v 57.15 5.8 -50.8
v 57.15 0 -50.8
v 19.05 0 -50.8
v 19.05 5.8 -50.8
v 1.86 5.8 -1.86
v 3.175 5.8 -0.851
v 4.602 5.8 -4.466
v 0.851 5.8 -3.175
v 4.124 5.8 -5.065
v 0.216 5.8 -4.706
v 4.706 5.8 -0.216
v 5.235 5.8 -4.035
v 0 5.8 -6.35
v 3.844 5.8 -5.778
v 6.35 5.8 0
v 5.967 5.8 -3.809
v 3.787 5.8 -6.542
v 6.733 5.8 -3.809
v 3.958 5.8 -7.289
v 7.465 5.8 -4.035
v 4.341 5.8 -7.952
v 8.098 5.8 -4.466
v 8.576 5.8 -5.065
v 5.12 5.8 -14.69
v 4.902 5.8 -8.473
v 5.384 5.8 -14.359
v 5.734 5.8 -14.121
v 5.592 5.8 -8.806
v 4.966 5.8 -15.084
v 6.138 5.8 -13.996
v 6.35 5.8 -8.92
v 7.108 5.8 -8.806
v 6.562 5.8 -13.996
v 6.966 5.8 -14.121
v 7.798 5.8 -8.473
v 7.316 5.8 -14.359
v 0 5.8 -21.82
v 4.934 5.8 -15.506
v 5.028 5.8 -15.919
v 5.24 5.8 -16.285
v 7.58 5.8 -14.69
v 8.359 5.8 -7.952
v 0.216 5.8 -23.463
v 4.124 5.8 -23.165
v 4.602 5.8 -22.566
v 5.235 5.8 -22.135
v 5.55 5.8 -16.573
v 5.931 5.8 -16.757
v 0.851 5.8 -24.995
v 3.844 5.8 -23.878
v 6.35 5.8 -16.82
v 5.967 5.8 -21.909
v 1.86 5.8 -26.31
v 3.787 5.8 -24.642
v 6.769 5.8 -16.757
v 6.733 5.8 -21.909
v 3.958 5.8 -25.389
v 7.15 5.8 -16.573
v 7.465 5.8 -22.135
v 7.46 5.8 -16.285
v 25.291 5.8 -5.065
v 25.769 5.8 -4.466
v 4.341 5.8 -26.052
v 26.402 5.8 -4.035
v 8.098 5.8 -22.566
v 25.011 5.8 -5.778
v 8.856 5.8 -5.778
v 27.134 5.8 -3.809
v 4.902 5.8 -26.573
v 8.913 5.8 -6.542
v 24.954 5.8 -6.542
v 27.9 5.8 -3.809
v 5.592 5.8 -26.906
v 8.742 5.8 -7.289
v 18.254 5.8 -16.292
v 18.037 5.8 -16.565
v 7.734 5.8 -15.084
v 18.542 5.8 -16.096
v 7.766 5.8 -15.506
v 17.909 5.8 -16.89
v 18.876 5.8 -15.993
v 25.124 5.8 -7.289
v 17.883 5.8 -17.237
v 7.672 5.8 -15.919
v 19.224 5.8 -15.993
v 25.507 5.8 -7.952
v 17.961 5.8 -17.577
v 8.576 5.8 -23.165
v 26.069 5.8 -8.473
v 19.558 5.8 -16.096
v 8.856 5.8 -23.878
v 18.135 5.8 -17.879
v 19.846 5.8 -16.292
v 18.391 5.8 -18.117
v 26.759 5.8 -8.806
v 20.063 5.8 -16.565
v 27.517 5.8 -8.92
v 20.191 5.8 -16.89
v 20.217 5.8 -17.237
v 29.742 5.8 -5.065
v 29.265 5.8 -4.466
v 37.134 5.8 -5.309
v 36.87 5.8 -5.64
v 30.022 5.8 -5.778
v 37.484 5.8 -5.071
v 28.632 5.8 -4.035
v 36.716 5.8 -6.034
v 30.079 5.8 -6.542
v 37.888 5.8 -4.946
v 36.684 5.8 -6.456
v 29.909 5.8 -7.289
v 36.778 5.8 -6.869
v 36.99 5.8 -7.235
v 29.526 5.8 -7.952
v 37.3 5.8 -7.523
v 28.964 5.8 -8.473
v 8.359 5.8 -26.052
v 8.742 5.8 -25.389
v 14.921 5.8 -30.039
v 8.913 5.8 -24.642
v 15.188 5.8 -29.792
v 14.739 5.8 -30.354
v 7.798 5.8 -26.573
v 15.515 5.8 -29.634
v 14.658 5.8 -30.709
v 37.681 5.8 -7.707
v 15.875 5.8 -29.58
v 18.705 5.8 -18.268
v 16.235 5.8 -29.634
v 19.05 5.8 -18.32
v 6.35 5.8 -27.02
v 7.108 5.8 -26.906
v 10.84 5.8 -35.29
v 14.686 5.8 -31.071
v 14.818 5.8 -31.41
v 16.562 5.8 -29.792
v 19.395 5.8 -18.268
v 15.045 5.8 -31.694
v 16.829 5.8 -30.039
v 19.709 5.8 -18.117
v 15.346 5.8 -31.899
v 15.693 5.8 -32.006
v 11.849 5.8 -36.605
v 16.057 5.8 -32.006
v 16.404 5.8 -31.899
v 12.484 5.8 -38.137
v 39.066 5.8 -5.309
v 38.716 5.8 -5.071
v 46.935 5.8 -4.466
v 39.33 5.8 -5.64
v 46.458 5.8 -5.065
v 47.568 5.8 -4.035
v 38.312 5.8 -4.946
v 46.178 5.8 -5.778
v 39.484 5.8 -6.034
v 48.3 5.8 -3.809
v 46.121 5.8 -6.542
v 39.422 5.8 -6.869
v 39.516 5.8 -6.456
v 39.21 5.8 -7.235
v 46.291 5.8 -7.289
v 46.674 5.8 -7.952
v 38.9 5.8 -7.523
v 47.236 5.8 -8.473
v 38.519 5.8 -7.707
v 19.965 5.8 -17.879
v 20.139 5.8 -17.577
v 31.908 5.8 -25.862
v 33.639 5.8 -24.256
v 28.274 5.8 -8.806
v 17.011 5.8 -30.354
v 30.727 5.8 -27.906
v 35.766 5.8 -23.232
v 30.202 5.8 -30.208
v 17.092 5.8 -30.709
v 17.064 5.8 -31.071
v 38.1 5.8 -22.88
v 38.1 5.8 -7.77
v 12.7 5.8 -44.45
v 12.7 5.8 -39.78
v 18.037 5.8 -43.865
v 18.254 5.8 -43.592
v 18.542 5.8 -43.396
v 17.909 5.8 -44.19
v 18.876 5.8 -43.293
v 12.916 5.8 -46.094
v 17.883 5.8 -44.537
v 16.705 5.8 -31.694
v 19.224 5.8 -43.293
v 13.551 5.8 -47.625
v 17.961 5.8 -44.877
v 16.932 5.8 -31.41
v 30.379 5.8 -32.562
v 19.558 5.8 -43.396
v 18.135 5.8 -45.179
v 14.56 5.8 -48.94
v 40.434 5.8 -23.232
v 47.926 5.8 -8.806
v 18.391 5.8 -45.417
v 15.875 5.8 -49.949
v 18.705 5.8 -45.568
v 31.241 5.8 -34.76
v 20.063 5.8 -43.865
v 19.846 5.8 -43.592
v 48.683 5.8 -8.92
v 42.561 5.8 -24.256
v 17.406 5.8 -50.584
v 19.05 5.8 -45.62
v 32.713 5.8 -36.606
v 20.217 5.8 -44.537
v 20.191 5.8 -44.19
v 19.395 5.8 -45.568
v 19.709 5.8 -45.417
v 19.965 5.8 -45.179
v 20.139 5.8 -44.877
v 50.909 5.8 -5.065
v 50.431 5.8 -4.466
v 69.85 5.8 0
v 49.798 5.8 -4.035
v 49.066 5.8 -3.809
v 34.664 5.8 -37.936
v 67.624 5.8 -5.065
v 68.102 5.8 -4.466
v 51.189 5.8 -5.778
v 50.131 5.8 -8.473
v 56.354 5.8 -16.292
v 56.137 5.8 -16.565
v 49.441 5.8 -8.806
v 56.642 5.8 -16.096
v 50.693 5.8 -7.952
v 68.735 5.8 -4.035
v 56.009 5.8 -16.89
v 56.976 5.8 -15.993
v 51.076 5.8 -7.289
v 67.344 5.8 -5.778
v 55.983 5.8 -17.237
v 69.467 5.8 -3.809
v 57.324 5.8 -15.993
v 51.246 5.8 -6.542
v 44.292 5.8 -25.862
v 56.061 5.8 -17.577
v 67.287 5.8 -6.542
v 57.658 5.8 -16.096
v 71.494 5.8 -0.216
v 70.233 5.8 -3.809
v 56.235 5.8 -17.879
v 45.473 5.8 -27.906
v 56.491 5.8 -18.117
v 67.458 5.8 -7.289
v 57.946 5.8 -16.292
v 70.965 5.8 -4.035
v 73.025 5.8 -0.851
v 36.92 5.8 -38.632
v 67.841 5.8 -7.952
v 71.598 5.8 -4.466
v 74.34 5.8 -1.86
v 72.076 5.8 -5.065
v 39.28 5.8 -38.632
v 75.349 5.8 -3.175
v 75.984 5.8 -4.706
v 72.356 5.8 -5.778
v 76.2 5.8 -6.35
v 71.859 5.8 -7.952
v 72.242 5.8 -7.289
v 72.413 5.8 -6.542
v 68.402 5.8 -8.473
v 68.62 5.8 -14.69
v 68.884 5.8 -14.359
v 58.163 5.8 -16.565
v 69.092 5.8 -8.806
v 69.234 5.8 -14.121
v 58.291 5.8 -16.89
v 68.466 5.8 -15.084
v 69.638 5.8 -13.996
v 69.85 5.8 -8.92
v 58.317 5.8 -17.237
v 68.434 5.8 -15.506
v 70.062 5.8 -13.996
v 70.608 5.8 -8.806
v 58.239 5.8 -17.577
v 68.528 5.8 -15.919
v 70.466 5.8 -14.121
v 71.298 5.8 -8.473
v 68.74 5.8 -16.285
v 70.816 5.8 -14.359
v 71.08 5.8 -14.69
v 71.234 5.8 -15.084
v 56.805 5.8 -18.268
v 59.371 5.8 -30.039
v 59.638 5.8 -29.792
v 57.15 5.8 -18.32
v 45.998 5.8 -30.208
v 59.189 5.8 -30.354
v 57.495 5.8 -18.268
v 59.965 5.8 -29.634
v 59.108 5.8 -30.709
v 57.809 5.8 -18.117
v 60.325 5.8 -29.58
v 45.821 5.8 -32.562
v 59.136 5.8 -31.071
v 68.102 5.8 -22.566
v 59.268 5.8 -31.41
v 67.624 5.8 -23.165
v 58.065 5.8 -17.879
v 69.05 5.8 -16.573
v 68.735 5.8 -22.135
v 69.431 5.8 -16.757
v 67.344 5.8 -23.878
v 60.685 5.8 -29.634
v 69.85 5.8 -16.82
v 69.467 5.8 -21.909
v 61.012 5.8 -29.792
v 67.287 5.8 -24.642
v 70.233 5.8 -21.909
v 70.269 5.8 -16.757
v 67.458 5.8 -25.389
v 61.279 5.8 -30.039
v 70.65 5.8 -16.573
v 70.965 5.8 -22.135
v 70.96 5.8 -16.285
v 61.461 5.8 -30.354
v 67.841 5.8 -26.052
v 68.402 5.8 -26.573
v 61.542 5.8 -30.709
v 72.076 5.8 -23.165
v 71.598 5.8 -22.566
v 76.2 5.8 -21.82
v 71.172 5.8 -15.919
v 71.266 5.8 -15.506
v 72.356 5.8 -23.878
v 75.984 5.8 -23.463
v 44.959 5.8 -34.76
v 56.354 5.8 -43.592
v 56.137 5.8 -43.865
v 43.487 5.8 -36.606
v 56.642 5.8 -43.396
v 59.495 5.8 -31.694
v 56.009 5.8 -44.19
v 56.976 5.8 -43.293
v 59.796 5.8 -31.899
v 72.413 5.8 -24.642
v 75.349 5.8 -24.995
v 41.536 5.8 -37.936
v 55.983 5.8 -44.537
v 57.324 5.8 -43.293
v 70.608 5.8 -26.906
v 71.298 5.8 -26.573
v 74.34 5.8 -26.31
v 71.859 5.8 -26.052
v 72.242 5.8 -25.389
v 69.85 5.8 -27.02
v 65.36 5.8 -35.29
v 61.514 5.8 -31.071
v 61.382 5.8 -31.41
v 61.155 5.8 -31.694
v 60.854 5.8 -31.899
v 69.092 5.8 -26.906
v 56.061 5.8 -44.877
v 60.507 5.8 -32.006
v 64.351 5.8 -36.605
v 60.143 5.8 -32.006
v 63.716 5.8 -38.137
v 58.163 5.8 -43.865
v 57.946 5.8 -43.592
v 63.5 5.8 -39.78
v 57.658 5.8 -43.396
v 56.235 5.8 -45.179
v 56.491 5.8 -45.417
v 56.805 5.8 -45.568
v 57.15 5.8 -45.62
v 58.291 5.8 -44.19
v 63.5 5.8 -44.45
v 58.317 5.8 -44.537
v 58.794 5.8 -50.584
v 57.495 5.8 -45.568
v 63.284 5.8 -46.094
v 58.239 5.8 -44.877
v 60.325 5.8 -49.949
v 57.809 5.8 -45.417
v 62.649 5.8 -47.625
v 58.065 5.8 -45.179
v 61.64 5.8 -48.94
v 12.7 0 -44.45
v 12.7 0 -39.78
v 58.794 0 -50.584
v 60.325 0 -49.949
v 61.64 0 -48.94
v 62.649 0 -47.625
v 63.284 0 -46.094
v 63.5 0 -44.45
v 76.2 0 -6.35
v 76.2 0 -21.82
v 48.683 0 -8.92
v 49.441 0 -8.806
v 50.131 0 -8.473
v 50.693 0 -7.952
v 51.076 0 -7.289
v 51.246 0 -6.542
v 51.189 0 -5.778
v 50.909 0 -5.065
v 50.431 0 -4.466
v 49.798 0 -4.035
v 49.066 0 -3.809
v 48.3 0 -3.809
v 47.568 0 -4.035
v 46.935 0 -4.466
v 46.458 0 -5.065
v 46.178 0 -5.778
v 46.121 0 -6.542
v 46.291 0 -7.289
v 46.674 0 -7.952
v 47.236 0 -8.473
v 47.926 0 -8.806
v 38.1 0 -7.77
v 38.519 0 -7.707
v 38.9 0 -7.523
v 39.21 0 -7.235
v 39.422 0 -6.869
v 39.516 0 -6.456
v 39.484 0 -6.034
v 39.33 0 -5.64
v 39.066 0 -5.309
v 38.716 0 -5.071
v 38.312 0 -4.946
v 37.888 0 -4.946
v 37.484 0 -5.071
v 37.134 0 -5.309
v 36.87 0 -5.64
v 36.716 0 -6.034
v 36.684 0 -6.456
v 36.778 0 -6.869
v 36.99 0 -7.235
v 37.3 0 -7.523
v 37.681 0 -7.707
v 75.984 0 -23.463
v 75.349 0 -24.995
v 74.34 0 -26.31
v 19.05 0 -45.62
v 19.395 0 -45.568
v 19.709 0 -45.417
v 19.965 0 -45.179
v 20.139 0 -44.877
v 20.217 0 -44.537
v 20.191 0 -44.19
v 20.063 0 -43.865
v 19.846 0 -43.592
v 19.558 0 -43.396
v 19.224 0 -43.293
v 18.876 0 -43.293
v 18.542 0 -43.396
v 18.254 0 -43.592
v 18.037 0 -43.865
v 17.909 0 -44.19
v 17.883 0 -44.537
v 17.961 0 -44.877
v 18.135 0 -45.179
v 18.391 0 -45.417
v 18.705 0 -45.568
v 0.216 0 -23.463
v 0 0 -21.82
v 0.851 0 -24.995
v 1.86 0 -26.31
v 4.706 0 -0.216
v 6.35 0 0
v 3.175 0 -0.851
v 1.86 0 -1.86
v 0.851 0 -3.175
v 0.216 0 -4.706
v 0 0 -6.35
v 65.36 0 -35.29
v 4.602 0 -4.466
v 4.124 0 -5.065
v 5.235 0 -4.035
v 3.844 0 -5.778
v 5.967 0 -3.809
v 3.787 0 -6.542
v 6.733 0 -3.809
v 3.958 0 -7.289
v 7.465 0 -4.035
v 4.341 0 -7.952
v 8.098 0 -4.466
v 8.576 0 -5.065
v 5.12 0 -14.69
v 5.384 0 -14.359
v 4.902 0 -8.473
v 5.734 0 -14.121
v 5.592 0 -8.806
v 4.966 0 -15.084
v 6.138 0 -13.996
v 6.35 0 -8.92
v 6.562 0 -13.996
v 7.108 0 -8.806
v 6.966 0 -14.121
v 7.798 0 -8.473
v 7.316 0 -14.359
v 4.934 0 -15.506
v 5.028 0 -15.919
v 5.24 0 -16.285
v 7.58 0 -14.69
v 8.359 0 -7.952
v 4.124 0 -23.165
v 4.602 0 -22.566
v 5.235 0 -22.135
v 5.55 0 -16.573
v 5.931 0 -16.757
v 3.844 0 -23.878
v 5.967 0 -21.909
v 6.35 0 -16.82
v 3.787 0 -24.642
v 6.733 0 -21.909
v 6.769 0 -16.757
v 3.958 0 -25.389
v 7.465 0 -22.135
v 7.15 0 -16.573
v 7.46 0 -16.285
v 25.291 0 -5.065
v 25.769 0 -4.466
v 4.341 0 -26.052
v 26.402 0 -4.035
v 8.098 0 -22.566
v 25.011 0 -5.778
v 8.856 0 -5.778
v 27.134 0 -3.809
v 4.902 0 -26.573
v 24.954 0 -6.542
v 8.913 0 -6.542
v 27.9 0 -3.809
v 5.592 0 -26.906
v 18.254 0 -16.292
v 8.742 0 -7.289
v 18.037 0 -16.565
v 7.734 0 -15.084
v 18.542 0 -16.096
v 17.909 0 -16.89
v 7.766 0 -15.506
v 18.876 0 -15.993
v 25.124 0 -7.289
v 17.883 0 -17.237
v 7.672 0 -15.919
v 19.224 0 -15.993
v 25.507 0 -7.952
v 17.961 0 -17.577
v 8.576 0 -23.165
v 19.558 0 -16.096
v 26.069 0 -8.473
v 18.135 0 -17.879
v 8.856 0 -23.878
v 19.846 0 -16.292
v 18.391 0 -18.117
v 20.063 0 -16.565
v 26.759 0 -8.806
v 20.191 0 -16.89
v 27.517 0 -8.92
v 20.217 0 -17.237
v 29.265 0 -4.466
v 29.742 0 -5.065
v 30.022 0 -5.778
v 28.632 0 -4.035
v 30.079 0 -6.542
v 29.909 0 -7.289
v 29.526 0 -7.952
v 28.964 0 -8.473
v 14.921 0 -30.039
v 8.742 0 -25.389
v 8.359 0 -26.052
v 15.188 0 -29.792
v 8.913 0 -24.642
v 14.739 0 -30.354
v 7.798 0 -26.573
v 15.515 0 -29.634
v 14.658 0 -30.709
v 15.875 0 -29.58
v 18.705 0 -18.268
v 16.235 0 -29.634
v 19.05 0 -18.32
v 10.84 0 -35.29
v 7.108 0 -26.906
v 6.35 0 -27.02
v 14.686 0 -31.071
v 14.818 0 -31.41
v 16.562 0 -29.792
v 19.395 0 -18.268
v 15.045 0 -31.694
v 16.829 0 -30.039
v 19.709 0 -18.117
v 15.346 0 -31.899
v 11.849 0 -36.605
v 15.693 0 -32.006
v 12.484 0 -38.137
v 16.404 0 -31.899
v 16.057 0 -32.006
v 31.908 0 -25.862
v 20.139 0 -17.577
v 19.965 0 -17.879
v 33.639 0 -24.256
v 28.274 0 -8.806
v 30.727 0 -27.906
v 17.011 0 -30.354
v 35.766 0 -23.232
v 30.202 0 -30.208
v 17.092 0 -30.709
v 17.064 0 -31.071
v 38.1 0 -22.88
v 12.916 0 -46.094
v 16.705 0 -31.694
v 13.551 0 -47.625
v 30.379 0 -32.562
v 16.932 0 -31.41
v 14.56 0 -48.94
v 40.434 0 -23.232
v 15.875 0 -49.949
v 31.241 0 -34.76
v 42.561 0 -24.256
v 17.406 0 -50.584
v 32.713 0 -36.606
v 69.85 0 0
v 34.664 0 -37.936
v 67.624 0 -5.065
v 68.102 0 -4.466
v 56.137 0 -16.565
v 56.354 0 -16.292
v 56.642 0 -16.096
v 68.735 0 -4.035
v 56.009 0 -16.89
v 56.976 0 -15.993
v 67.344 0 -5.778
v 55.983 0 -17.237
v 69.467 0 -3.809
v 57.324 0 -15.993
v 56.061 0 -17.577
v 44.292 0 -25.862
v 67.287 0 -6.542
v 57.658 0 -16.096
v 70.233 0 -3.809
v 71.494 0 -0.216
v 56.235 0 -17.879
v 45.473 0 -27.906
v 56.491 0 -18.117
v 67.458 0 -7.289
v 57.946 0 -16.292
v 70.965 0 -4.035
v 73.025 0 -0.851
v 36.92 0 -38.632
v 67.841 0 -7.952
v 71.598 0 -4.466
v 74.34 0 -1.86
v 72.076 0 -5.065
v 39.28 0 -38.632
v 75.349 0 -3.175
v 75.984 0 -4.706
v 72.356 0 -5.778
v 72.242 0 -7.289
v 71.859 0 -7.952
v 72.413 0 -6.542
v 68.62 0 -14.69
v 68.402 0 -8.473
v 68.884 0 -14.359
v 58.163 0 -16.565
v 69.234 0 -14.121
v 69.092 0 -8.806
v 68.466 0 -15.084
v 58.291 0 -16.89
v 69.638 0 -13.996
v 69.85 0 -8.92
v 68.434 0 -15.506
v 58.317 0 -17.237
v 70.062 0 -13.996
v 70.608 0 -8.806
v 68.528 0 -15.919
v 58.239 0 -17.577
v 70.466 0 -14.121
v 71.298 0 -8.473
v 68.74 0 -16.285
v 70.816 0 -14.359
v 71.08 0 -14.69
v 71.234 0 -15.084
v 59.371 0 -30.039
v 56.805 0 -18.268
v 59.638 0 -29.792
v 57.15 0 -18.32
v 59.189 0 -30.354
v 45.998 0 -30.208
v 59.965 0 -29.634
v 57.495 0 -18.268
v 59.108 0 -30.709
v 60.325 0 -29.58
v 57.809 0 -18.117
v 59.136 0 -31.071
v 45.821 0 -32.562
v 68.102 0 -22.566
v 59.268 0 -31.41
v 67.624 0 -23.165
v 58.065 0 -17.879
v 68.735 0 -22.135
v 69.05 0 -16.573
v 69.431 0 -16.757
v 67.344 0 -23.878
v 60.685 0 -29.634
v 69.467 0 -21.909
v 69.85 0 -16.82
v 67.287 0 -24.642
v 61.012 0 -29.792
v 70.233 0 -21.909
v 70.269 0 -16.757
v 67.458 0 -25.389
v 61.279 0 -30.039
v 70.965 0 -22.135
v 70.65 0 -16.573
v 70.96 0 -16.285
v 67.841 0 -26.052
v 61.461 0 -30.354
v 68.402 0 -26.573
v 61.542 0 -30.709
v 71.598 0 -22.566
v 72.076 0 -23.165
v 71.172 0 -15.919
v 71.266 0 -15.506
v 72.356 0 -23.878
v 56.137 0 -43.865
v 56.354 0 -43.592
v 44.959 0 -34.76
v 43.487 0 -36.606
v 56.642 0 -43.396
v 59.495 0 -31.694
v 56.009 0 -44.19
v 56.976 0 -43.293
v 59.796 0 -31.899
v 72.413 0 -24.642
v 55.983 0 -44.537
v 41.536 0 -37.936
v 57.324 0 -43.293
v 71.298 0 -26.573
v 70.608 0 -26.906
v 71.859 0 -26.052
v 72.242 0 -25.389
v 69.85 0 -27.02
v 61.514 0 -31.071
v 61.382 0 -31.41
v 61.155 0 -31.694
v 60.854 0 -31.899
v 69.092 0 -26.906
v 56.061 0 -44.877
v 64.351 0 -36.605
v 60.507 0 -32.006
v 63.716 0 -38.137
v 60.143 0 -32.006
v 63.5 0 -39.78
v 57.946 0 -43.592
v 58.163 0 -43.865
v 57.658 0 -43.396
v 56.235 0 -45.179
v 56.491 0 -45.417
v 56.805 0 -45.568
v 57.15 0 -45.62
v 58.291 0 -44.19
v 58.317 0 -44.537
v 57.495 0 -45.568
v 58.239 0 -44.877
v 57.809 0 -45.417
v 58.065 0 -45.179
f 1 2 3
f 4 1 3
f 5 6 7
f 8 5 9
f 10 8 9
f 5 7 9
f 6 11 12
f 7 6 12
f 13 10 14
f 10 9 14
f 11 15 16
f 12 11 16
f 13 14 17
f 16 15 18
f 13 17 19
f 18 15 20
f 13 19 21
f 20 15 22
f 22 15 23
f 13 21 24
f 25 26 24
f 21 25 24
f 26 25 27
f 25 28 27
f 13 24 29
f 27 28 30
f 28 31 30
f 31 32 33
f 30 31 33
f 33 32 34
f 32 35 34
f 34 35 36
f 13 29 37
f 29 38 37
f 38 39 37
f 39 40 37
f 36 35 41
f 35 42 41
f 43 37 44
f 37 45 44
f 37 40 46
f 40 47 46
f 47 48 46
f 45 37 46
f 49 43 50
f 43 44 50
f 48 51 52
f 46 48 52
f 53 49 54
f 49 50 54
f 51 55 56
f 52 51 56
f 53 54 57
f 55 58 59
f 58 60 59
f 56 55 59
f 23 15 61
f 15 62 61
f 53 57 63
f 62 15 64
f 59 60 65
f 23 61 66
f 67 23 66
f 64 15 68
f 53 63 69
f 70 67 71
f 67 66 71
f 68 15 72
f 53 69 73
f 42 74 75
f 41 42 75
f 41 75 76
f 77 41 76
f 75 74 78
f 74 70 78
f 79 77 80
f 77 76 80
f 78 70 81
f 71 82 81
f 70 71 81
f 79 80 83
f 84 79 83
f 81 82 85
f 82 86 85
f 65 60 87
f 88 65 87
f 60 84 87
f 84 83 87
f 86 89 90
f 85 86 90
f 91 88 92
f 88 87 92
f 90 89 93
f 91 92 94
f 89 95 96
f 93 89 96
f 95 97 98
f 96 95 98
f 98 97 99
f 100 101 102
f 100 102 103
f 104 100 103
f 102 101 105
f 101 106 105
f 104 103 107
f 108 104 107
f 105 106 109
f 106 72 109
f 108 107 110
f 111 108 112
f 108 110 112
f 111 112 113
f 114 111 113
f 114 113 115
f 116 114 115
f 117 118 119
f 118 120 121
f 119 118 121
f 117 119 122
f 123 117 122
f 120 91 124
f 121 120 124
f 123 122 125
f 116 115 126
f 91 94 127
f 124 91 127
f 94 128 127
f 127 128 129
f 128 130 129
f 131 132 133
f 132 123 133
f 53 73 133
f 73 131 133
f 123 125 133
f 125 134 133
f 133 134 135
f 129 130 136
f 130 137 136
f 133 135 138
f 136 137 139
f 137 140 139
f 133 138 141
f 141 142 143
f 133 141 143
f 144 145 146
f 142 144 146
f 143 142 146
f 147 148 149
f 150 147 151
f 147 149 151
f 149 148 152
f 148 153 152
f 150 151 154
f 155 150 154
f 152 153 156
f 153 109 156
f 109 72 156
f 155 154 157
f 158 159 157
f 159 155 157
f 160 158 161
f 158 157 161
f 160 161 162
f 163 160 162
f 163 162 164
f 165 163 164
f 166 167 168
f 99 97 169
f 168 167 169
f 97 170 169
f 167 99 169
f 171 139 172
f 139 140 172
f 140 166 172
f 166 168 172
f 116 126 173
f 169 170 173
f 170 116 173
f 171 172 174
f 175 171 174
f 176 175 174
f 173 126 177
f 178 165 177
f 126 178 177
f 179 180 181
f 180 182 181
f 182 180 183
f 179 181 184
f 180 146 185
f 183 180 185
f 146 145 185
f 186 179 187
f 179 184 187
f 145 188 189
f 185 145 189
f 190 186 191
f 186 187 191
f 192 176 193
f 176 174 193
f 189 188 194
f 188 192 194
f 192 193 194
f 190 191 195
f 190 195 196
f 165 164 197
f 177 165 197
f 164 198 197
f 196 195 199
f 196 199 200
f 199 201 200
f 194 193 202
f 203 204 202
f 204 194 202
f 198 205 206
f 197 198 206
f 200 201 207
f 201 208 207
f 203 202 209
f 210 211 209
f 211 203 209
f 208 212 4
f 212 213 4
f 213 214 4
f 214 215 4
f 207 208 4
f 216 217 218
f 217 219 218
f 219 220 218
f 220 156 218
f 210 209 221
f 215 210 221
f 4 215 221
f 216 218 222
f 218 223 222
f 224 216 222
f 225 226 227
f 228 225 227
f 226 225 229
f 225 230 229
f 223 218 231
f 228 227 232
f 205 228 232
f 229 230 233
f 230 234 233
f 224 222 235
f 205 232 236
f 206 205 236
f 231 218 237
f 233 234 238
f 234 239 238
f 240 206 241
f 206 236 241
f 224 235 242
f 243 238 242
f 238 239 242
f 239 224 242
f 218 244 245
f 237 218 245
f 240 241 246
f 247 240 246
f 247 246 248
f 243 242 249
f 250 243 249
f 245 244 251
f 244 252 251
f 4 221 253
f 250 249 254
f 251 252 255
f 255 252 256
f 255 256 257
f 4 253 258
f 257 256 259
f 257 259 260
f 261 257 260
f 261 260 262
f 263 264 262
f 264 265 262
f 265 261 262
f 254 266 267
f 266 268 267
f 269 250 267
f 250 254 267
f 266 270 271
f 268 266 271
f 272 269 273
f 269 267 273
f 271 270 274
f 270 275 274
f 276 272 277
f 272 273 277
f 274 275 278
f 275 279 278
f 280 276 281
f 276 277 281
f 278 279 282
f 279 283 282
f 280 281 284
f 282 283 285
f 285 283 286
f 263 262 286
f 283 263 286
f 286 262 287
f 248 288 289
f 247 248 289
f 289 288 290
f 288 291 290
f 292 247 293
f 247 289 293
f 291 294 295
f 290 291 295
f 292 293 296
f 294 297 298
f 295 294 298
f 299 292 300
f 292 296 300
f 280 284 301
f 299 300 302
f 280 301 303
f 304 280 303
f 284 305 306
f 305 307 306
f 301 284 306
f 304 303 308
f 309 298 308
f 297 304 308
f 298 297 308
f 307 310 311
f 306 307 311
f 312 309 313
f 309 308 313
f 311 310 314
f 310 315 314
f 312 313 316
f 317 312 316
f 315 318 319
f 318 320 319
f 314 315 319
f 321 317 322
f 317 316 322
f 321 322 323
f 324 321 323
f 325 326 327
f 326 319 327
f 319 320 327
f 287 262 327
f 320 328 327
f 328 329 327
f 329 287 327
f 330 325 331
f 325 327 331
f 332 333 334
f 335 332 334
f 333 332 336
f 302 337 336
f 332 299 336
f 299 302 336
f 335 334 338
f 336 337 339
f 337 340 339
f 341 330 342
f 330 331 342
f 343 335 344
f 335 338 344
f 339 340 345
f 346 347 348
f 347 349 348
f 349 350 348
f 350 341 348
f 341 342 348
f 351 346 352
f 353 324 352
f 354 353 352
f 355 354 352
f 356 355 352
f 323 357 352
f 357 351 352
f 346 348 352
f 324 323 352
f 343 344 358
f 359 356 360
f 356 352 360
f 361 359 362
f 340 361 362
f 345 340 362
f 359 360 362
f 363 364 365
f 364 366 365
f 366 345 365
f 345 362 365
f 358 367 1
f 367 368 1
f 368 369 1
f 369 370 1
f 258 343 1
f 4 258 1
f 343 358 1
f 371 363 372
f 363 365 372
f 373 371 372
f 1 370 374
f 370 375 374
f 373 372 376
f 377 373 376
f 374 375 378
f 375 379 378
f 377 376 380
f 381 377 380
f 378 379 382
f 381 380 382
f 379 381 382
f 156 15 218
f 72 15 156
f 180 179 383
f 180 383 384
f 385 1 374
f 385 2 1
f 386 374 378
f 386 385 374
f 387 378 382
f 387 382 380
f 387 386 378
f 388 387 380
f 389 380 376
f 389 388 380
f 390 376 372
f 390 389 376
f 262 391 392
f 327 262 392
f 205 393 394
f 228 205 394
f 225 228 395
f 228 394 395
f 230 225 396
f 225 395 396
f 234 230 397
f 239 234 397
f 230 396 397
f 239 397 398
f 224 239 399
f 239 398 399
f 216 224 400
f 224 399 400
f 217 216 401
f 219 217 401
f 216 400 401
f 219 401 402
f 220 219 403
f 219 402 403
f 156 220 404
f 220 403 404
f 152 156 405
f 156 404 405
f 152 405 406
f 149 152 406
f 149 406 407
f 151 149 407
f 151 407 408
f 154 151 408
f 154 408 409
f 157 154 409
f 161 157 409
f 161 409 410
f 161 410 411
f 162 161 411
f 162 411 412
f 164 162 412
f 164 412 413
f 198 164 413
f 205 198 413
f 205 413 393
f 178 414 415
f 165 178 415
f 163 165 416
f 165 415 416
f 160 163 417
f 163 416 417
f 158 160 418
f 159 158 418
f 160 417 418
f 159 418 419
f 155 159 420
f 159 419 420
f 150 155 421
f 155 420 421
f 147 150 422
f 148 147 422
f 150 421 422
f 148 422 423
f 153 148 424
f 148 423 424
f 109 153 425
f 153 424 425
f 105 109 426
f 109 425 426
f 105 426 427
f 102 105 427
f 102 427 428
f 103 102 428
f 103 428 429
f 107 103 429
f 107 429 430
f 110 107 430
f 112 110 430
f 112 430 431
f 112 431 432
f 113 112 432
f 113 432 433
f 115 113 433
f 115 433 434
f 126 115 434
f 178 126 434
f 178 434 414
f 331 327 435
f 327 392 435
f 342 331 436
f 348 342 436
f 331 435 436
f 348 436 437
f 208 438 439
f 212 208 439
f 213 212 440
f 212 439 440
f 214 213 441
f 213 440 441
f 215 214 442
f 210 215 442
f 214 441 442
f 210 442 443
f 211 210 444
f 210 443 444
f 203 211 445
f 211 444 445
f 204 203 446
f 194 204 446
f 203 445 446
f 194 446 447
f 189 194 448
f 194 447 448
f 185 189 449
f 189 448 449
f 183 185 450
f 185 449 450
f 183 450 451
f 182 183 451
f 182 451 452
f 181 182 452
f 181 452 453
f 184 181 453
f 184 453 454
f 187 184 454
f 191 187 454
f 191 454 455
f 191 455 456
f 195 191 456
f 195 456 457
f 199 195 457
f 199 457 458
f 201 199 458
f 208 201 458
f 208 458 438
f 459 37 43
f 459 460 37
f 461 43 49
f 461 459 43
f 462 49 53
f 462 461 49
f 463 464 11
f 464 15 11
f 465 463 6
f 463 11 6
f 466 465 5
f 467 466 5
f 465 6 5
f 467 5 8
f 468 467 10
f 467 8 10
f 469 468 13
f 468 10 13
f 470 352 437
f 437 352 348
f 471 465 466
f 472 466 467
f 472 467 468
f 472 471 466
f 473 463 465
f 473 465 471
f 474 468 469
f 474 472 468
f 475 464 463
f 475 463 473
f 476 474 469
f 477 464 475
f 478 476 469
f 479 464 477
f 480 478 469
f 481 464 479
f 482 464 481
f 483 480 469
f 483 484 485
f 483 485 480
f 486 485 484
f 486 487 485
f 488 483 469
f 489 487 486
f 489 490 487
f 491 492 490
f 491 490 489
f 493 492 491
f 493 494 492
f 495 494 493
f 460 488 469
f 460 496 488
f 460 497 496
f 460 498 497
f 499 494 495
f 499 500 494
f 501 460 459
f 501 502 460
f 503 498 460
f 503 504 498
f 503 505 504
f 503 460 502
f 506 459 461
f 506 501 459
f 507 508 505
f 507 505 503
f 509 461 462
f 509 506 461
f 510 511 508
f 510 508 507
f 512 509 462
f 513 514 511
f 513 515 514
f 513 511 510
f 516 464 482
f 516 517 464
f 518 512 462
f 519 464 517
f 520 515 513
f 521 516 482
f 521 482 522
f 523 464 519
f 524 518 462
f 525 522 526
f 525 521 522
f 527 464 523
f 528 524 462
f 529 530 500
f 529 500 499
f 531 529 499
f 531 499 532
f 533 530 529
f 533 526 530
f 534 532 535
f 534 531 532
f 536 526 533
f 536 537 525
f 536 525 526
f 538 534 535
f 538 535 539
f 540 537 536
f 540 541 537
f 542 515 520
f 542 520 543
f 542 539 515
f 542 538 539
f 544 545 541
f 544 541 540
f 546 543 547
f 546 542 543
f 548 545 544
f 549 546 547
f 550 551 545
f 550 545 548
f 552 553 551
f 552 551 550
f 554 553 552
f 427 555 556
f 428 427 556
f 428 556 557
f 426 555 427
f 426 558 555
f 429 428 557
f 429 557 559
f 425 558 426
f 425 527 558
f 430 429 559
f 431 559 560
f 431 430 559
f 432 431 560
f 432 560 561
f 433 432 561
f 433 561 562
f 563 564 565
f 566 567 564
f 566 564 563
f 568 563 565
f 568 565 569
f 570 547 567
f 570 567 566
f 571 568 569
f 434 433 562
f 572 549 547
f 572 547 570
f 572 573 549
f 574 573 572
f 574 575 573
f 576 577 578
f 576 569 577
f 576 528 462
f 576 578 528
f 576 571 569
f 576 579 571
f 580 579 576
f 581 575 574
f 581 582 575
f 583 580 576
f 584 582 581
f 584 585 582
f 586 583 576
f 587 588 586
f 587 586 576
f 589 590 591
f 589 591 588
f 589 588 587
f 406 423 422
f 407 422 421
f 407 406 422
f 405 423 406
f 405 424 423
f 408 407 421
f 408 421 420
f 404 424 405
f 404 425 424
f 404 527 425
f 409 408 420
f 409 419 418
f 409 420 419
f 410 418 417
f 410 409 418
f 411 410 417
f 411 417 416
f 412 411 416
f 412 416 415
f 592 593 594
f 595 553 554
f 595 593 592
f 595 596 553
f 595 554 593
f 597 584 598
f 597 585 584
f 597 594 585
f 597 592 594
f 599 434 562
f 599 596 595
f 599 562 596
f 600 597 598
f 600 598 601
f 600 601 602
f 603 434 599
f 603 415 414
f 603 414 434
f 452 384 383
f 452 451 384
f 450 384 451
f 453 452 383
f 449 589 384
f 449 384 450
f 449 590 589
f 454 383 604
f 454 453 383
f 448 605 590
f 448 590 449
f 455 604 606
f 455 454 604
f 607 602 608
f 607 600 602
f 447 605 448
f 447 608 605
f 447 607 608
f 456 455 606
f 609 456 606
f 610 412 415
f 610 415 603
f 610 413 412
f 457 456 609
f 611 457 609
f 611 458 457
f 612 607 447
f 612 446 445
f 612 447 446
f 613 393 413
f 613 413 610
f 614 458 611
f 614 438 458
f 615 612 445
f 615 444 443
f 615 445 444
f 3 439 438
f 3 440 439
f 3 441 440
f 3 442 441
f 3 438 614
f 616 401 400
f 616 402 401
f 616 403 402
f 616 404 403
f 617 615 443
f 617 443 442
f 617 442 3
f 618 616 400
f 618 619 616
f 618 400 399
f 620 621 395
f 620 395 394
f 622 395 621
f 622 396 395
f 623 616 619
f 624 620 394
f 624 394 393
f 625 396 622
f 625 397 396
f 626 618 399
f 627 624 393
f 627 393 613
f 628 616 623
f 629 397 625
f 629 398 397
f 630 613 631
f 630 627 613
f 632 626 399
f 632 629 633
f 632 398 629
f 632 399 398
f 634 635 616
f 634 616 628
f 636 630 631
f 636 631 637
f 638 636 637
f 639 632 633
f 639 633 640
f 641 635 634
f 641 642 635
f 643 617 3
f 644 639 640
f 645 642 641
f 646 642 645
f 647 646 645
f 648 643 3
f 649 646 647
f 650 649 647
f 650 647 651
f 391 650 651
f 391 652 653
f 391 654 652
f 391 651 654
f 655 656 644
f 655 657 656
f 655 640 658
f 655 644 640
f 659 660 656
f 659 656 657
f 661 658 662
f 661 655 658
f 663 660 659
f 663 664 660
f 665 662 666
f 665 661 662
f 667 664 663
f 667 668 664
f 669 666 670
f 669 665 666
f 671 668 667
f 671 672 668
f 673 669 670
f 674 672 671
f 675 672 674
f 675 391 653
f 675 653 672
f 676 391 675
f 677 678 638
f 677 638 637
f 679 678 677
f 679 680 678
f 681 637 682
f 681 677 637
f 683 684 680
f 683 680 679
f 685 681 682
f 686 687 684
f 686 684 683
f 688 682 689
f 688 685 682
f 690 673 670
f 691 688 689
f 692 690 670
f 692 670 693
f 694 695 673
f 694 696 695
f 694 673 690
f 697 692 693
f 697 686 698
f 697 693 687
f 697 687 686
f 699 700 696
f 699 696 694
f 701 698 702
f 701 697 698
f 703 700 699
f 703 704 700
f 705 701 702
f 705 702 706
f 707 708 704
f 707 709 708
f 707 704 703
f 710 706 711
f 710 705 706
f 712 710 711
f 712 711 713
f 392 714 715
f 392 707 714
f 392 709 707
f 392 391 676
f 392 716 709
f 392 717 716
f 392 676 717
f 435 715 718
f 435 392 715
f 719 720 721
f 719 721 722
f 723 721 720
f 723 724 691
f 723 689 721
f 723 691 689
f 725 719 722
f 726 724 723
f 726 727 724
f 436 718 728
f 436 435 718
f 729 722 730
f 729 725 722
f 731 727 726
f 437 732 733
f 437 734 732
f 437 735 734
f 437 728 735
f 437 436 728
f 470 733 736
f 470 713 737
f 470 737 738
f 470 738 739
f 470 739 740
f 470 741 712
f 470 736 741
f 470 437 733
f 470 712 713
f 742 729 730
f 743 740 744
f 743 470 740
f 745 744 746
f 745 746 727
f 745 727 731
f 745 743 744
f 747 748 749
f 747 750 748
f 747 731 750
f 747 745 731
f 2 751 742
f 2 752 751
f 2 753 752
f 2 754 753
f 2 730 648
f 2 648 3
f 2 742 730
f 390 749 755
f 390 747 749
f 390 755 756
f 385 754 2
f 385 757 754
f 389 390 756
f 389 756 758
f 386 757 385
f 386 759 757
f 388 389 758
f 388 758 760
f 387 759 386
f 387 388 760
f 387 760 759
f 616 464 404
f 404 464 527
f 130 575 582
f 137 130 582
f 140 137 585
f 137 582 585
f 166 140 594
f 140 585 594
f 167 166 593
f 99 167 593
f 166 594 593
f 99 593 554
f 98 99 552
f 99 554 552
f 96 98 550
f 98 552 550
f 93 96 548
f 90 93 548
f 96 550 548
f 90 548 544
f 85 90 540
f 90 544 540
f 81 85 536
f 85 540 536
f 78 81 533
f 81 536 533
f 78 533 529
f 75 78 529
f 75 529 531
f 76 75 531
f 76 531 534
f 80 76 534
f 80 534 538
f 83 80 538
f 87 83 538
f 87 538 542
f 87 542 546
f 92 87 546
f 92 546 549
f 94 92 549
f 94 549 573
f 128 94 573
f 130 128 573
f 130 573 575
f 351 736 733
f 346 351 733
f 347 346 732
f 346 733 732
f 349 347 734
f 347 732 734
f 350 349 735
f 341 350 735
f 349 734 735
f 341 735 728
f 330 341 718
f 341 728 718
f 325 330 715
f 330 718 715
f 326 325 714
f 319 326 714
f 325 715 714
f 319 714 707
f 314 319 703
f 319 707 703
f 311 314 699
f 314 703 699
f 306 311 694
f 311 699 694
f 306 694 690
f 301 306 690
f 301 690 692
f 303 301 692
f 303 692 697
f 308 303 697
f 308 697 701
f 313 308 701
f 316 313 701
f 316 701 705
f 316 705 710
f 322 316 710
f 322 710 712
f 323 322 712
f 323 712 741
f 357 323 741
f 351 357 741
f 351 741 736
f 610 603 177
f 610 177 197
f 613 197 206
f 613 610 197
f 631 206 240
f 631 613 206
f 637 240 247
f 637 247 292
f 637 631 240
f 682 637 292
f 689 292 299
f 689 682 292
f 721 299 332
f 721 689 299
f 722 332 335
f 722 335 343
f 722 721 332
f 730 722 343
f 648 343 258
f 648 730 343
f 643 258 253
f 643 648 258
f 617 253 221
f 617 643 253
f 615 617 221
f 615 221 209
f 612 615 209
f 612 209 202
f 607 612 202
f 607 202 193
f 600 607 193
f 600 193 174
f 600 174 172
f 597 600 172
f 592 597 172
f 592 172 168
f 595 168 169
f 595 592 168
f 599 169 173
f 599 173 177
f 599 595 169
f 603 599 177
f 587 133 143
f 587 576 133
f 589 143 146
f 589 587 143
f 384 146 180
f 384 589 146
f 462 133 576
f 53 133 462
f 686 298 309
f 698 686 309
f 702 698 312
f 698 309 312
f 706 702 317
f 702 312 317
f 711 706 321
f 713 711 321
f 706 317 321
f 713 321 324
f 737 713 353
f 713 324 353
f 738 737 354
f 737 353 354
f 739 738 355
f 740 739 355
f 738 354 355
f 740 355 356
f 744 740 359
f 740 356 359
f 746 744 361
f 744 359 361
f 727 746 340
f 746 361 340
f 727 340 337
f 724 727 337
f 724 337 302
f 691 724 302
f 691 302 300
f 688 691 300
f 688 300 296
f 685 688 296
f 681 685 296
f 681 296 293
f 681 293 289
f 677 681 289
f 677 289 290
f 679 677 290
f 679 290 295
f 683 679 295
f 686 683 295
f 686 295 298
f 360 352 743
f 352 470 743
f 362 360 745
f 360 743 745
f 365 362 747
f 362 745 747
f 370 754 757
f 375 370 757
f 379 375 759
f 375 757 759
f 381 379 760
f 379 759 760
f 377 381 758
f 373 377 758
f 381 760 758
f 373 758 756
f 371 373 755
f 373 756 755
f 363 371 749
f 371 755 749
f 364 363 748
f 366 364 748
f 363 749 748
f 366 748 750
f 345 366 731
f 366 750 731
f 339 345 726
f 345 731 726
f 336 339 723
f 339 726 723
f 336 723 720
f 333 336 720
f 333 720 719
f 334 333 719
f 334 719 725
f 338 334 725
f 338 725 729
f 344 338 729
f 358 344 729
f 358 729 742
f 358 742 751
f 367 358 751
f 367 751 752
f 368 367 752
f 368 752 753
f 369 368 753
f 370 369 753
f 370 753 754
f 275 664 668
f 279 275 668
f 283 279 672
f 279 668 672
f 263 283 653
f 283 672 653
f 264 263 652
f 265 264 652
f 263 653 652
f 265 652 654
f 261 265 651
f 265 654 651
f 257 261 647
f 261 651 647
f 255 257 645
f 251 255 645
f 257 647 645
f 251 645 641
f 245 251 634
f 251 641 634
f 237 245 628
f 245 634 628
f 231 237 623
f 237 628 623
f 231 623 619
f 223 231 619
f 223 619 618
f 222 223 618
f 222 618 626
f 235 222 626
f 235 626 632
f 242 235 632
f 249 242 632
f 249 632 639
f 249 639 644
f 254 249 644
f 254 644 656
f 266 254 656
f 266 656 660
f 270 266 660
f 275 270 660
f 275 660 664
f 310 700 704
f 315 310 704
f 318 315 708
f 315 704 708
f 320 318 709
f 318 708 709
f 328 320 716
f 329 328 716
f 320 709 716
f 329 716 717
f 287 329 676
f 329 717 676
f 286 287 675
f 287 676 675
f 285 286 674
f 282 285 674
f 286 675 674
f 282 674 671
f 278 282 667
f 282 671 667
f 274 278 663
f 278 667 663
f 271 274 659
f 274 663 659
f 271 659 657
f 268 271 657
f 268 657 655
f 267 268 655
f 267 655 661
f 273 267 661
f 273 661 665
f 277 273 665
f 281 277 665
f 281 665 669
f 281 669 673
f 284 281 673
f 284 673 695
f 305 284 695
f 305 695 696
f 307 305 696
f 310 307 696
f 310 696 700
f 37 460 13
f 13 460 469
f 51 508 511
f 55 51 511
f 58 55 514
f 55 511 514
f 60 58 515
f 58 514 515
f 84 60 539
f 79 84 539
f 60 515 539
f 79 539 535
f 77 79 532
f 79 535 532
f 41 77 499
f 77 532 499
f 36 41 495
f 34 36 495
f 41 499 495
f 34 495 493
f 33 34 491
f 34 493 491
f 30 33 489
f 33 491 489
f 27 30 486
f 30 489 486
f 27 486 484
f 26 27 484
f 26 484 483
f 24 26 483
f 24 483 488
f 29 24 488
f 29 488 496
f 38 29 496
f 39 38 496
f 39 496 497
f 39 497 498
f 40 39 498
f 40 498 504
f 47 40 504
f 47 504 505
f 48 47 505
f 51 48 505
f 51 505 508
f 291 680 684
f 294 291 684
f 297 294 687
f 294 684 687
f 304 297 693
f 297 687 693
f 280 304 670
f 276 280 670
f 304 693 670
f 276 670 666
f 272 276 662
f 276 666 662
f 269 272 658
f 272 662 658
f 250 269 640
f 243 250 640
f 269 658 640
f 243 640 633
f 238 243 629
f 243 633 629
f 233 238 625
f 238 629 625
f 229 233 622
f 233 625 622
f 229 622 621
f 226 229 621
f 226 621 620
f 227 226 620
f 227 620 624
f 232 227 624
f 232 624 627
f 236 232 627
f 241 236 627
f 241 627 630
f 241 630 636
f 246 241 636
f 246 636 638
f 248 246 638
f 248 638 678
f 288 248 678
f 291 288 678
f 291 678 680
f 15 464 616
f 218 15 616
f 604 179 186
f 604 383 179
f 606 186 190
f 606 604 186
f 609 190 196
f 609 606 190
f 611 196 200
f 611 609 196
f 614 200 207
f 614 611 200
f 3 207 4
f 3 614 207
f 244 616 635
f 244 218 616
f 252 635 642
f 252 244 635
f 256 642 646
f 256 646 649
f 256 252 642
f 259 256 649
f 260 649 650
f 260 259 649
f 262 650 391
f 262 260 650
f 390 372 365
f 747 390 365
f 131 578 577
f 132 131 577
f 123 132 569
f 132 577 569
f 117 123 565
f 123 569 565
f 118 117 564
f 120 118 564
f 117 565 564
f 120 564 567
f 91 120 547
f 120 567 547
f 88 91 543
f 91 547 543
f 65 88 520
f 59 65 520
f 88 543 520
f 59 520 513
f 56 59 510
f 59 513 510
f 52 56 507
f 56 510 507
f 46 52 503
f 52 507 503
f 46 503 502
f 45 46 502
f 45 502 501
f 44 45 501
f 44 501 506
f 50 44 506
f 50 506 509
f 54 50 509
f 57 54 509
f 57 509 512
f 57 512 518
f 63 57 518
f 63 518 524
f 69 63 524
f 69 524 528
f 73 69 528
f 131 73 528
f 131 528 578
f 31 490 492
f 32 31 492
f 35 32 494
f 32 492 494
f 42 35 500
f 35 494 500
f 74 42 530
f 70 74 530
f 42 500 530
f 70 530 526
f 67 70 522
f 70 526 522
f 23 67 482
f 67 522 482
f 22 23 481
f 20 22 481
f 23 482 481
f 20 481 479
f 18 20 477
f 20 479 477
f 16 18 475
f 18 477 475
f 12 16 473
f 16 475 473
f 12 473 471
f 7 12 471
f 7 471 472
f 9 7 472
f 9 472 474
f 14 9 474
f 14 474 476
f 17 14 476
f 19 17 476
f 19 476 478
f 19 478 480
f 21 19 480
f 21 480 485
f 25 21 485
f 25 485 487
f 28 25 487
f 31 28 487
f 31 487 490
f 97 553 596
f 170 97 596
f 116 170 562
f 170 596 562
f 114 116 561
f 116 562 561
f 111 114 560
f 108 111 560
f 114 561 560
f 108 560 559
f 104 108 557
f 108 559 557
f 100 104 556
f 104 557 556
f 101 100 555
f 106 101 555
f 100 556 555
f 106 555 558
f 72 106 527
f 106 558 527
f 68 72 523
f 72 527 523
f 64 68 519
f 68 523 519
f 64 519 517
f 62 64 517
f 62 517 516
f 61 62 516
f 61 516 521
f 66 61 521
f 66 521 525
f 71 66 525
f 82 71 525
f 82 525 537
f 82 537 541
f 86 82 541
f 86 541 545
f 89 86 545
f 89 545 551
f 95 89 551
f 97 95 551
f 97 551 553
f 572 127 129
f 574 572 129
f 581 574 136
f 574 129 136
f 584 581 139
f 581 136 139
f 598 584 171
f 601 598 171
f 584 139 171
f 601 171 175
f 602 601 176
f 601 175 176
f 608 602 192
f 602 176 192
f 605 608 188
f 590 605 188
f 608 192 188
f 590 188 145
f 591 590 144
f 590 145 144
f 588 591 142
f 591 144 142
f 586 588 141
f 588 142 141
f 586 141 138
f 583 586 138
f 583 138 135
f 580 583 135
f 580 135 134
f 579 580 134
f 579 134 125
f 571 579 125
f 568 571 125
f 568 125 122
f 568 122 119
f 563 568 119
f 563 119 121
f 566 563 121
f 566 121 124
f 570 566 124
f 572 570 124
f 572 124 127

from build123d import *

# Parameters (mm, degrees)
SKETCH1_R           = 8
BOSS_EXTRUDE1_DEPTH = 5.8
SKETCH2_R           = 1.3
CUT_EXTRUDE1_DEPTH  = 92.764481146
SKETCH14_R          = 1.25
M3_TAP_DEPTH        = 92.764481146
SKETCH15_R          = 2.65
M5_THROUGH_DEPTH    = 92.764481146
CUT_EXTRUDE2_DEPTH  = 92.764481146
FILLET2_R           = 6.35
SKETCH13_R          = 1.5
CUT_EXTRUDE3_DEPTH  = 92.764481146
MOVE_FACE1_BY       = 0.08
MOVE_FACE1_2_BY     = 0.08
MOVE_FACE1_3_BY     = 0.08
MOVE_FACE1_4_BY     = 0.08
MOVE_FACE1_5_BY     = 0.08
MOVE_FACE1_6_BY     = 0.08
MOVE_FACE1_7_BY     = 0.08
MOVE_FACE1_8_BY     = 0.08
MOVE_FACE1_9_BY     = 0.08
MOVE_FACE1_10_BY    = 0.08
MOVE_FACE1_11_BY    = 0.08
MOVE_FACE1_12_BY    = 0.08
MOVE_FACE1_13_BY    = 0.08
MOVE_FACE1_14_BY    = 0.08
MOVE_FACE1_15_BY    = 0.08
MOVE_FACE1_16_BY    = 0.08


with BuildPart() as part:
    # Sketch1 → Boss-Extrude1 (new body)
    with BuildSketch(Plane(origin=(0, 0, 0), x_dir=(1, 0, 0), z_dir=(0, 1, 0))):
        Polygon((0, 0), (76.2, 0), (76.2, 50.8), (38.1, 50.8), (0, 50.8), align=None)
        with Locations(Location((38.1, 30.8, 0), (0, 0, 270))):
            Circle(SKETCH1_R, mode=Mode.SUBTRACT)
    extrude(amount=BOSS_EXTRUDE1_DEPTH)

    # Sketch2 → Cut-Extrude1 (cut, through all)
    with BuildSketch(Plane(origin=(0, 5.8, 0), x_dir=(1, 0, 0), z_dir=(0, 1, 0))):
        with Locations(Location((15.875, 30.8, 0), (0, 0, 270))):
            Circle(SKETCH2_R)
        with Locations(Location((60.325, 30.8, 0), (0, 0, 270))):
            Circle(SKETCH2_R)
    extrude(amount=-CUT_EXTRUDE1_DEPTH, mode=Mode.SUBTRACT)

    # Sketch14 → M3-tap (cut, through all)
    with BuildSketch(Plane.XZ):
        with Locations(Location((57.15, -44.45, 0), (0, 0, 270))):
            Circle(SKETCH14_R)
        with Locations(Location((19.05, -44.45, 0), (0, 0, 270))):
            Circle(SKETCH14_R)
        with Locations(Location((19.05, -17.15, 0), (0, 0, 270))):
            Circle(SKETCH14_R)
        with Locations(Location((57.15, -17.15, 0), (0, 0, 270))):
            Circle(SKETCH14_R)
    extrude(amount=-M3_TAP_DEPTH, mode=Mode.SUBTRACT)

    # Sketch15 → M5-through (cut, through all)
    with BuildSketch(Plane.XZ):
        with Locations(Location((69.85, -24.45004, 0), (0, 0, 270))):
            Circle(SKETCH15_R)
        with Locations(Location((69.85, -6.35, 0), (0, 0, 270))):
            Circle(SKETCH15_R)
        with Locations(Location((48.683333333, -6.35, 0), (0, 0, 270))):
            Circle(SKETCH15_R)
        with Locations(Location((27.516666667, -6.35, 0), (0, 0, 270))):
            Circle(SKETCH15_R)
        with Locations(Location((6.35, -6.35, 0), (0, 0, 270))):
            Circle(SKETCH15_R)
        with Locations(Location((6.35, -24.45004, 0), (0, 0, 270))):
            Circle(SKETCH15_R)
    extrude(amount=-M5_THROUGH_DEPTH, mode=Mode.SUBTRACT)

    # Sketch12 → Cut-Extrude2 (cut, through all)
    with BuildSketch(Plane(origin=(0, 5.8, 0), x_dir=(1, 0, 0), z_dir=(0, 1, 0))):
        Polygon((0, 50.8), (12.7, 50.8), (12.7, 37.15), (0, 24.45), align=None)
        Polygon((63.5, 50.8), (63.5, 37.15), (76.2, 24.45), (76.2, 50.8), align=None)
    extrude(amount=-CUT_EXTRUDE2_DEPTH, mode=Mode.SUBTRACT)

    # Fillet2
    fillet2_edges = [part.edges().sort_by_distance(p)[0] for p in [
        (0, 2.9, -24.45),
        (12.7, 2.9, -50.8),
        (12.7, 2.9, -37.15),
        (76.2, 2.9, 0),
        (63.5, 2.9, -50.8),
        (0, 2.9, 0),
        (76.2, 2.9, -24.45),
        (63.5, 2.9, -37.15),
    ]]
    fillet(fillet2_edges, radius=FILLET2_R)

    # Sketch13 → Cut-Extrude3 (cut, through all)
    with BuildSketch(Plane.XZ):
        with Locations(Location((69.85, -15.40002, 0), (0, 0, 270))):
            Circle(SKETCH13_R)
        with Locations(Location((38.1, -6.35, 0), (0, 0, 270))):
            Circle(SKETCH13_R)
        with Locations(Location((6.35, -15.40002, 0), (0, 0, 270))):
            Circle(SKETCH13_R)
    extrude(amount=-CUT_EXTRUDE3_DEPTH, mode=Mode.SUBTRACT)

    # Move Face1: a curved face moved outward by 0.08
    add(Solid.thicken(part.faces().sort_by_distance((38.1, 2.9, -38.8))[0], MOVE_FACE1_BY))

    # Move Face1 2: a curved face moved outward by 0.08
    add(Solid.thicken(part.faces().sort_by_distance((15.875, 2.9, -32.1))[0], MOVE_FACE1_2_BY))

    # Move Face1 3: a curved face moved outward by 0.08
    add(Solid.thicken(part.faces().sort_by_distance((60.325, 2.9, -32.1))[0], MOVE_FACE1_3_BY))

    # Move Face1 4: a curved face moved outward by 0.08
    add(Solid.thicken(part.faces().sort_by_distance((57.15, 2.9, -43.2))[0], MOVE_FACE1_4_BY))

    # Move Face1 5: a curved face moved outward by 0.08
    add(Solid.thicken(part.faces().sort_by_distance((19.05, 2.9, -43.2))[0], MOVE_FACE1_5_BY))

    # Move Face1 6: a curved face moved outward by 0.08
    add(Solid.thicken(part.faces().sort_by_distance((19.05, 2.9, -15.9))[0], MOVE_FACE1_6_BY))

    # Move Face1 7: a curved face moved outward by 0.08
    add(Solid.thicken(part.faces().sort_by_distance((57.15, 2.9, -15.9))[0], MOVE_FACE1_7_BY))

    # Move Face1 8: a curved face moved outward by 0.08
    add(Solid.thicken(part.faces().sort_by_distance((69.85, 2.9, -21.80004))[0], MOVE_FACE1_8_BY))

    # Move Face1 9: a curved face moved outward by 0.08
    add(Solid.thicken(part.faces().sort_by_distance((69.85, 2.9, -3.7))[0], MOVE_FACE1_9_BY))

    # Move Face1 10: a curved face moved outward by 0.08
    add(Solid.thicken(part.faces().sort_by_distance((48.683333333, 2.9, -3.7))[0], MOVE_FACE1_10_BY))

    # Move Face1 11: a curved face moved outward by 0.08
    add(Solid.thicken(part.faces().sort_by_distance((27.516666667, 2.9, -3.7))[0], MOVE_FACE1_11_BY))

    # Move Face1 12: a curved face moved outward by 0.08
    add(Solid.thicken(part.faces().sort_by_distance((6.35, 2.9, -3.7))[0], MOVE_FACE1_12_BY))

    # Move Face1 13: a curved face moved outward by 0.08
    add(Solid.thicken(part.faces().sort_by_distance((6.35, 2.9, -21.80004))[0], MOVE_FACE1_13_BY))

    # Move Face1 14: a curved face moved outward by 0.08
    add(Solid.thicken(part.faces().sort_by_distance((69.85, 2.9, -13.90002))[0], MOVE_FACE1_14_BY))

    # Move Face1 15: a curved face moved outward by 0.08
    add(Solid.thicken(part.faces().sort_by_distance((38.1, 2.9, -4.85))[0], MOVE_FACE1_15_BY))

    # Move Face1 16: a curved face moved outward by 0.08
    add(Solid.thicken(part.faces().sort_by_distance((6.35, 2.9, -13.90002))[0], MOVE_FACE1_16_BY))


solid = part.part
